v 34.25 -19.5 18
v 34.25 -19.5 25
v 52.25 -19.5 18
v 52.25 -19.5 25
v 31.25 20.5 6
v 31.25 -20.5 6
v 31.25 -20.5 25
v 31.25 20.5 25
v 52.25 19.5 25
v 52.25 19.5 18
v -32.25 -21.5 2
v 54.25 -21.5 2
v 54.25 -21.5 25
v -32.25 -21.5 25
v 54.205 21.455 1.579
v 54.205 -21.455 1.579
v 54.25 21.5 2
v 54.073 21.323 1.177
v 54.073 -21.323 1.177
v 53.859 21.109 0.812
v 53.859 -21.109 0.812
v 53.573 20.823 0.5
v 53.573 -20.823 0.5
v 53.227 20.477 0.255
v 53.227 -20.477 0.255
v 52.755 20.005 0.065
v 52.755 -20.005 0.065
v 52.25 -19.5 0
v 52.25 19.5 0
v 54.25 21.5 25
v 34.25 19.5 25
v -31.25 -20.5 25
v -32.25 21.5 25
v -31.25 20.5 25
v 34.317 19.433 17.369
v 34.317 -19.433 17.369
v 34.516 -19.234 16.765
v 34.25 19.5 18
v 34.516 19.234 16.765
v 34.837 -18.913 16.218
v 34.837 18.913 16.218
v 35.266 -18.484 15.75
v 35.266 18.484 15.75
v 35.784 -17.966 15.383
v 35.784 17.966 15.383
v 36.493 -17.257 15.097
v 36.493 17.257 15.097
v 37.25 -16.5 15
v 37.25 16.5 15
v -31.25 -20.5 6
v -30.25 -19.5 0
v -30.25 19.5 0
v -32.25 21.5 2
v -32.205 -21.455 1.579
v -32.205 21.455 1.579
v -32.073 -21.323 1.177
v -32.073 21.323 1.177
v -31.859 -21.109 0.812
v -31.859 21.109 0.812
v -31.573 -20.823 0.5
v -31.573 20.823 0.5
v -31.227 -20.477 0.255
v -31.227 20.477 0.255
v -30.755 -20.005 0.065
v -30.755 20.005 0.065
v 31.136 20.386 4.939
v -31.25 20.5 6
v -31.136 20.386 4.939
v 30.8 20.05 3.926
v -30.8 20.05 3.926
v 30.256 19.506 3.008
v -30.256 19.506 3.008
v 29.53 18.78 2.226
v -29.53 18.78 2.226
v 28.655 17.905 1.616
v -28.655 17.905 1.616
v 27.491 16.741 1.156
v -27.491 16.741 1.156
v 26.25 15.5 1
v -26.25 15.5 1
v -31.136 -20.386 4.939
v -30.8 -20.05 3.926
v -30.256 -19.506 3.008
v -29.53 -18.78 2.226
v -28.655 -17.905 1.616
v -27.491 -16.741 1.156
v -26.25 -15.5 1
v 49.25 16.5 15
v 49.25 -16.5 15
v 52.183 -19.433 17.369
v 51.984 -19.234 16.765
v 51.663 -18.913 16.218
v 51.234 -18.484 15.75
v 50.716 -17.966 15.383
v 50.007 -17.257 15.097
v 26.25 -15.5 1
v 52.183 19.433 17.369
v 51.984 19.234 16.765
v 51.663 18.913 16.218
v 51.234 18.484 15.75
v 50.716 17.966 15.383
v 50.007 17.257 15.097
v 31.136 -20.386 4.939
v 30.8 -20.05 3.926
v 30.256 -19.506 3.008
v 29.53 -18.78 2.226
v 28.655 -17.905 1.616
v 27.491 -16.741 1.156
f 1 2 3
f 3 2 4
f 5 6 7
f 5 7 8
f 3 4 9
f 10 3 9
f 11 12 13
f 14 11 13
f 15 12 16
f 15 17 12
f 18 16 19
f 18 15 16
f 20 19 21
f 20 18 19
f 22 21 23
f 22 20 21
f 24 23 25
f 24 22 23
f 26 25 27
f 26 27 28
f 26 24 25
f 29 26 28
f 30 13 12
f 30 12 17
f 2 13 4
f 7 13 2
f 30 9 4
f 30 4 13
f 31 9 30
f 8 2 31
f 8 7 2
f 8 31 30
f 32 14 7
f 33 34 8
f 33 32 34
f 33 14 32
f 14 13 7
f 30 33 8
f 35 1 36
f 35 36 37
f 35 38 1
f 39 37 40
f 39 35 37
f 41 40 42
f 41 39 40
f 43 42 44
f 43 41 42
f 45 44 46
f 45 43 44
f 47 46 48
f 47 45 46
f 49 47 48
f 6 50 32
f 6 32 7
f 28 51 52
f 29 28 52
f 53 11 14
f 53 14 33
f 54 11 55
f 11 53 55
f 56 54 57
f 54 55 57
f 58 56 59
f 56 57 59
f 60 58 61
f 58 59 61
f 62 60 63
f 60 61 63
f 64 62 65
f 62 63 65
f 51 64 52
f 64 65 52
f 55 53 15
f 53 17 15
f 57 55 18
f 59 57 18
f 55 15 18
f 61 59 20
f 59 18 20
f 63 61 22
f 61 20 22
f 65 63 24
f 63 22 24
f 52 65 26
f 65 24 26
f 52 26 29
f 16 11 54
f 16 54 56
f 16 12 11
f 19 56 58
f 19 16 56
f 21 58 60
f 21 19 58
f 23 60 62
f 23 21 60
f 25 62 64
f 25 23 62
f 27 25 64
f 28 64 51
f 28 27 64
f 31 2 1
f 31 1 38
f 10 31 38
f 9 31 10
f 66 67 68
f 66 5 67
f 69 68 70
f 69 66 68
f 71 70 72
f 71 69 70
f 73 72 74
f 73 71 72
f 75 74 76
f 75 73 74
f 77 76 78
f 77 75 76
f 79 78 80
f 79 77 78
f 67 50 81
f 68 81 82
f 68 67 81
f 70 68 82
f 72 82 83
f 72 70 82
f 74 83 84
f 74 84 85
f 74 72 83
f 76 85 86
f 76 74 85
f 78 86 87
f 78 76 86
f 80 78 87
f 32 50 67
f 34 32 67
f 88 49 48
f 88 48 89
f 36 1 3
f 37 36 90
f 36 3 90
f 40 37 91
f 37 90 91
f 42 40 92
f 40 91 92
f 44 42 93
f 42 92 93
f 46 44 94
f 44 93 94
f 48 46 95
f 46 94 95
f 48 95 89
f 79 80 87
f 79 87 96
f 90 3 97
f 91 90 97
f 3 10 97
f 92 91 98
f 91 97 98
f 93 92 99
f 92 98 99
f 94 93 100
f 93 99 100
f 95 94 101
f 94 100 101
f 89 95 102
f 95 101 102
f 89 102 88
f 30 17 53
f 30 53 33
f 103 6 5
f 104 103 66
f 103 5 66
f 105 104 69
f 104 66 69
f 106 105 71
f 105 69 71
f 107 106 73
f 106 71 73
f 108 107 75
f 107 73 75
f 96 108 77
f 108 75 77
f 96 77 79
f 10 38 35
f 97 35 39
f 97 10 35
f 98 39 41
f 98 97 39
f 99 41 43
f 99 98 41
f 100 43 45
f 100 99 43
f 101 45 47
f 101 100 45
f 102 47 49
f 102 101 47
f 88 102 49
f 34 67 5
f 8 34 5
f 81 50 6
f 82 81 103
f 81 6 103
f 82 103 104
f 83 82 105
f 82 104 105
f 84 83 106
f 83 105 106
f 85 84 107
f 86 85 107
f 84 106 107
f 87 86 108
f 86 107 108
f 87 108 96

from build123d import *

# Parameters (mm, degrees)
SKETCH002_W     = 64.5
SKETCH002_H     = 43
PAD001_DEPTH    = 25
THICKNESS_T     = -1
FILLET001_R     = 5
SKETCH008_W     = 43
SKETCH008_H     = 25
PAD006_DEPTH    = 22
SKETCH009_W     = 18
SKETCH009_H     = 39
POCKET002_DEPTH = 10
FILLET005_R     = 3
FILLET006_R     = 2


with BuildPart() as part:
    # Sketch002 → Pad001 (new body)
    with BuildSketch(Plane.XY):
        Rectangle(SKETCH002_W, SKETCH002_H)
    extrude(amount=PAD001_DEPTH)

    # Thickness
    thickness_openings = [part.faces().sort_by_distance(p)[0] for p in [
        (0, 0, 25),
    ]]
    offset(amount=THICKNESS_T, openings=thickness_openings)

    # Fillet001
    fillet001_edges = [part.edges().sort_by_distance(p)[0] for p in [
        (0, 20.5, 1),
        (31.25, 0, 1),
        (0, -20.5, 1),
        (-31.25, 0, 1),
    ]]
    fillet(fillet001_edges, radius=FILLET001_R)

    # Sketch008 (on DatumPlane) → Pad006 (join)
    with BuildSketch(Plane.YZ.offset(32.25)):
        with Locations((0, 12.5)):
            Rectangle(SKETCH008_W, SKETCH008_H)
    extrude(amount=PAD006_DEPTH)

    # Sketch009 (on DatumPlane) → Pocket002 (cut)
    with BuildSketch(Plane.XY.offset(25)):
        with Locations((43.25, 0)):
            Rectangle(SKETCH009_W, SKETCH009_H)
    extrude(amount=-POCKET002_DEPTH, mode=Mode.SUBTRACT)

    # Fillet005
    fillet005_edges = [part.edges().sort_by_distance(p)[0] for p in [
        (43.25, 19.5, 15),
        (52.25, 0, 15),
        (43.25, -19.5, 15),
        (34.25, 0, 15),
    ]]
    fillet(fillet005_edges, radius=FILLET005_R)

    # Fillet006
    fillet006_edges = [part.edges().sort_by_distance(p)[0] for p in [
        (0, 21.5, 0),
        (32.25, 0, 0),
        (0, -21.5, 0),
        (-32.25, 0, 0),
        (43.25, 21.5, 0),
        (43.25, -21.5, 0),
        (54.25, 0, 0),
    ]]
    fillet(fillet006_edges, radius=FILLET006_R)


solid = part.part
